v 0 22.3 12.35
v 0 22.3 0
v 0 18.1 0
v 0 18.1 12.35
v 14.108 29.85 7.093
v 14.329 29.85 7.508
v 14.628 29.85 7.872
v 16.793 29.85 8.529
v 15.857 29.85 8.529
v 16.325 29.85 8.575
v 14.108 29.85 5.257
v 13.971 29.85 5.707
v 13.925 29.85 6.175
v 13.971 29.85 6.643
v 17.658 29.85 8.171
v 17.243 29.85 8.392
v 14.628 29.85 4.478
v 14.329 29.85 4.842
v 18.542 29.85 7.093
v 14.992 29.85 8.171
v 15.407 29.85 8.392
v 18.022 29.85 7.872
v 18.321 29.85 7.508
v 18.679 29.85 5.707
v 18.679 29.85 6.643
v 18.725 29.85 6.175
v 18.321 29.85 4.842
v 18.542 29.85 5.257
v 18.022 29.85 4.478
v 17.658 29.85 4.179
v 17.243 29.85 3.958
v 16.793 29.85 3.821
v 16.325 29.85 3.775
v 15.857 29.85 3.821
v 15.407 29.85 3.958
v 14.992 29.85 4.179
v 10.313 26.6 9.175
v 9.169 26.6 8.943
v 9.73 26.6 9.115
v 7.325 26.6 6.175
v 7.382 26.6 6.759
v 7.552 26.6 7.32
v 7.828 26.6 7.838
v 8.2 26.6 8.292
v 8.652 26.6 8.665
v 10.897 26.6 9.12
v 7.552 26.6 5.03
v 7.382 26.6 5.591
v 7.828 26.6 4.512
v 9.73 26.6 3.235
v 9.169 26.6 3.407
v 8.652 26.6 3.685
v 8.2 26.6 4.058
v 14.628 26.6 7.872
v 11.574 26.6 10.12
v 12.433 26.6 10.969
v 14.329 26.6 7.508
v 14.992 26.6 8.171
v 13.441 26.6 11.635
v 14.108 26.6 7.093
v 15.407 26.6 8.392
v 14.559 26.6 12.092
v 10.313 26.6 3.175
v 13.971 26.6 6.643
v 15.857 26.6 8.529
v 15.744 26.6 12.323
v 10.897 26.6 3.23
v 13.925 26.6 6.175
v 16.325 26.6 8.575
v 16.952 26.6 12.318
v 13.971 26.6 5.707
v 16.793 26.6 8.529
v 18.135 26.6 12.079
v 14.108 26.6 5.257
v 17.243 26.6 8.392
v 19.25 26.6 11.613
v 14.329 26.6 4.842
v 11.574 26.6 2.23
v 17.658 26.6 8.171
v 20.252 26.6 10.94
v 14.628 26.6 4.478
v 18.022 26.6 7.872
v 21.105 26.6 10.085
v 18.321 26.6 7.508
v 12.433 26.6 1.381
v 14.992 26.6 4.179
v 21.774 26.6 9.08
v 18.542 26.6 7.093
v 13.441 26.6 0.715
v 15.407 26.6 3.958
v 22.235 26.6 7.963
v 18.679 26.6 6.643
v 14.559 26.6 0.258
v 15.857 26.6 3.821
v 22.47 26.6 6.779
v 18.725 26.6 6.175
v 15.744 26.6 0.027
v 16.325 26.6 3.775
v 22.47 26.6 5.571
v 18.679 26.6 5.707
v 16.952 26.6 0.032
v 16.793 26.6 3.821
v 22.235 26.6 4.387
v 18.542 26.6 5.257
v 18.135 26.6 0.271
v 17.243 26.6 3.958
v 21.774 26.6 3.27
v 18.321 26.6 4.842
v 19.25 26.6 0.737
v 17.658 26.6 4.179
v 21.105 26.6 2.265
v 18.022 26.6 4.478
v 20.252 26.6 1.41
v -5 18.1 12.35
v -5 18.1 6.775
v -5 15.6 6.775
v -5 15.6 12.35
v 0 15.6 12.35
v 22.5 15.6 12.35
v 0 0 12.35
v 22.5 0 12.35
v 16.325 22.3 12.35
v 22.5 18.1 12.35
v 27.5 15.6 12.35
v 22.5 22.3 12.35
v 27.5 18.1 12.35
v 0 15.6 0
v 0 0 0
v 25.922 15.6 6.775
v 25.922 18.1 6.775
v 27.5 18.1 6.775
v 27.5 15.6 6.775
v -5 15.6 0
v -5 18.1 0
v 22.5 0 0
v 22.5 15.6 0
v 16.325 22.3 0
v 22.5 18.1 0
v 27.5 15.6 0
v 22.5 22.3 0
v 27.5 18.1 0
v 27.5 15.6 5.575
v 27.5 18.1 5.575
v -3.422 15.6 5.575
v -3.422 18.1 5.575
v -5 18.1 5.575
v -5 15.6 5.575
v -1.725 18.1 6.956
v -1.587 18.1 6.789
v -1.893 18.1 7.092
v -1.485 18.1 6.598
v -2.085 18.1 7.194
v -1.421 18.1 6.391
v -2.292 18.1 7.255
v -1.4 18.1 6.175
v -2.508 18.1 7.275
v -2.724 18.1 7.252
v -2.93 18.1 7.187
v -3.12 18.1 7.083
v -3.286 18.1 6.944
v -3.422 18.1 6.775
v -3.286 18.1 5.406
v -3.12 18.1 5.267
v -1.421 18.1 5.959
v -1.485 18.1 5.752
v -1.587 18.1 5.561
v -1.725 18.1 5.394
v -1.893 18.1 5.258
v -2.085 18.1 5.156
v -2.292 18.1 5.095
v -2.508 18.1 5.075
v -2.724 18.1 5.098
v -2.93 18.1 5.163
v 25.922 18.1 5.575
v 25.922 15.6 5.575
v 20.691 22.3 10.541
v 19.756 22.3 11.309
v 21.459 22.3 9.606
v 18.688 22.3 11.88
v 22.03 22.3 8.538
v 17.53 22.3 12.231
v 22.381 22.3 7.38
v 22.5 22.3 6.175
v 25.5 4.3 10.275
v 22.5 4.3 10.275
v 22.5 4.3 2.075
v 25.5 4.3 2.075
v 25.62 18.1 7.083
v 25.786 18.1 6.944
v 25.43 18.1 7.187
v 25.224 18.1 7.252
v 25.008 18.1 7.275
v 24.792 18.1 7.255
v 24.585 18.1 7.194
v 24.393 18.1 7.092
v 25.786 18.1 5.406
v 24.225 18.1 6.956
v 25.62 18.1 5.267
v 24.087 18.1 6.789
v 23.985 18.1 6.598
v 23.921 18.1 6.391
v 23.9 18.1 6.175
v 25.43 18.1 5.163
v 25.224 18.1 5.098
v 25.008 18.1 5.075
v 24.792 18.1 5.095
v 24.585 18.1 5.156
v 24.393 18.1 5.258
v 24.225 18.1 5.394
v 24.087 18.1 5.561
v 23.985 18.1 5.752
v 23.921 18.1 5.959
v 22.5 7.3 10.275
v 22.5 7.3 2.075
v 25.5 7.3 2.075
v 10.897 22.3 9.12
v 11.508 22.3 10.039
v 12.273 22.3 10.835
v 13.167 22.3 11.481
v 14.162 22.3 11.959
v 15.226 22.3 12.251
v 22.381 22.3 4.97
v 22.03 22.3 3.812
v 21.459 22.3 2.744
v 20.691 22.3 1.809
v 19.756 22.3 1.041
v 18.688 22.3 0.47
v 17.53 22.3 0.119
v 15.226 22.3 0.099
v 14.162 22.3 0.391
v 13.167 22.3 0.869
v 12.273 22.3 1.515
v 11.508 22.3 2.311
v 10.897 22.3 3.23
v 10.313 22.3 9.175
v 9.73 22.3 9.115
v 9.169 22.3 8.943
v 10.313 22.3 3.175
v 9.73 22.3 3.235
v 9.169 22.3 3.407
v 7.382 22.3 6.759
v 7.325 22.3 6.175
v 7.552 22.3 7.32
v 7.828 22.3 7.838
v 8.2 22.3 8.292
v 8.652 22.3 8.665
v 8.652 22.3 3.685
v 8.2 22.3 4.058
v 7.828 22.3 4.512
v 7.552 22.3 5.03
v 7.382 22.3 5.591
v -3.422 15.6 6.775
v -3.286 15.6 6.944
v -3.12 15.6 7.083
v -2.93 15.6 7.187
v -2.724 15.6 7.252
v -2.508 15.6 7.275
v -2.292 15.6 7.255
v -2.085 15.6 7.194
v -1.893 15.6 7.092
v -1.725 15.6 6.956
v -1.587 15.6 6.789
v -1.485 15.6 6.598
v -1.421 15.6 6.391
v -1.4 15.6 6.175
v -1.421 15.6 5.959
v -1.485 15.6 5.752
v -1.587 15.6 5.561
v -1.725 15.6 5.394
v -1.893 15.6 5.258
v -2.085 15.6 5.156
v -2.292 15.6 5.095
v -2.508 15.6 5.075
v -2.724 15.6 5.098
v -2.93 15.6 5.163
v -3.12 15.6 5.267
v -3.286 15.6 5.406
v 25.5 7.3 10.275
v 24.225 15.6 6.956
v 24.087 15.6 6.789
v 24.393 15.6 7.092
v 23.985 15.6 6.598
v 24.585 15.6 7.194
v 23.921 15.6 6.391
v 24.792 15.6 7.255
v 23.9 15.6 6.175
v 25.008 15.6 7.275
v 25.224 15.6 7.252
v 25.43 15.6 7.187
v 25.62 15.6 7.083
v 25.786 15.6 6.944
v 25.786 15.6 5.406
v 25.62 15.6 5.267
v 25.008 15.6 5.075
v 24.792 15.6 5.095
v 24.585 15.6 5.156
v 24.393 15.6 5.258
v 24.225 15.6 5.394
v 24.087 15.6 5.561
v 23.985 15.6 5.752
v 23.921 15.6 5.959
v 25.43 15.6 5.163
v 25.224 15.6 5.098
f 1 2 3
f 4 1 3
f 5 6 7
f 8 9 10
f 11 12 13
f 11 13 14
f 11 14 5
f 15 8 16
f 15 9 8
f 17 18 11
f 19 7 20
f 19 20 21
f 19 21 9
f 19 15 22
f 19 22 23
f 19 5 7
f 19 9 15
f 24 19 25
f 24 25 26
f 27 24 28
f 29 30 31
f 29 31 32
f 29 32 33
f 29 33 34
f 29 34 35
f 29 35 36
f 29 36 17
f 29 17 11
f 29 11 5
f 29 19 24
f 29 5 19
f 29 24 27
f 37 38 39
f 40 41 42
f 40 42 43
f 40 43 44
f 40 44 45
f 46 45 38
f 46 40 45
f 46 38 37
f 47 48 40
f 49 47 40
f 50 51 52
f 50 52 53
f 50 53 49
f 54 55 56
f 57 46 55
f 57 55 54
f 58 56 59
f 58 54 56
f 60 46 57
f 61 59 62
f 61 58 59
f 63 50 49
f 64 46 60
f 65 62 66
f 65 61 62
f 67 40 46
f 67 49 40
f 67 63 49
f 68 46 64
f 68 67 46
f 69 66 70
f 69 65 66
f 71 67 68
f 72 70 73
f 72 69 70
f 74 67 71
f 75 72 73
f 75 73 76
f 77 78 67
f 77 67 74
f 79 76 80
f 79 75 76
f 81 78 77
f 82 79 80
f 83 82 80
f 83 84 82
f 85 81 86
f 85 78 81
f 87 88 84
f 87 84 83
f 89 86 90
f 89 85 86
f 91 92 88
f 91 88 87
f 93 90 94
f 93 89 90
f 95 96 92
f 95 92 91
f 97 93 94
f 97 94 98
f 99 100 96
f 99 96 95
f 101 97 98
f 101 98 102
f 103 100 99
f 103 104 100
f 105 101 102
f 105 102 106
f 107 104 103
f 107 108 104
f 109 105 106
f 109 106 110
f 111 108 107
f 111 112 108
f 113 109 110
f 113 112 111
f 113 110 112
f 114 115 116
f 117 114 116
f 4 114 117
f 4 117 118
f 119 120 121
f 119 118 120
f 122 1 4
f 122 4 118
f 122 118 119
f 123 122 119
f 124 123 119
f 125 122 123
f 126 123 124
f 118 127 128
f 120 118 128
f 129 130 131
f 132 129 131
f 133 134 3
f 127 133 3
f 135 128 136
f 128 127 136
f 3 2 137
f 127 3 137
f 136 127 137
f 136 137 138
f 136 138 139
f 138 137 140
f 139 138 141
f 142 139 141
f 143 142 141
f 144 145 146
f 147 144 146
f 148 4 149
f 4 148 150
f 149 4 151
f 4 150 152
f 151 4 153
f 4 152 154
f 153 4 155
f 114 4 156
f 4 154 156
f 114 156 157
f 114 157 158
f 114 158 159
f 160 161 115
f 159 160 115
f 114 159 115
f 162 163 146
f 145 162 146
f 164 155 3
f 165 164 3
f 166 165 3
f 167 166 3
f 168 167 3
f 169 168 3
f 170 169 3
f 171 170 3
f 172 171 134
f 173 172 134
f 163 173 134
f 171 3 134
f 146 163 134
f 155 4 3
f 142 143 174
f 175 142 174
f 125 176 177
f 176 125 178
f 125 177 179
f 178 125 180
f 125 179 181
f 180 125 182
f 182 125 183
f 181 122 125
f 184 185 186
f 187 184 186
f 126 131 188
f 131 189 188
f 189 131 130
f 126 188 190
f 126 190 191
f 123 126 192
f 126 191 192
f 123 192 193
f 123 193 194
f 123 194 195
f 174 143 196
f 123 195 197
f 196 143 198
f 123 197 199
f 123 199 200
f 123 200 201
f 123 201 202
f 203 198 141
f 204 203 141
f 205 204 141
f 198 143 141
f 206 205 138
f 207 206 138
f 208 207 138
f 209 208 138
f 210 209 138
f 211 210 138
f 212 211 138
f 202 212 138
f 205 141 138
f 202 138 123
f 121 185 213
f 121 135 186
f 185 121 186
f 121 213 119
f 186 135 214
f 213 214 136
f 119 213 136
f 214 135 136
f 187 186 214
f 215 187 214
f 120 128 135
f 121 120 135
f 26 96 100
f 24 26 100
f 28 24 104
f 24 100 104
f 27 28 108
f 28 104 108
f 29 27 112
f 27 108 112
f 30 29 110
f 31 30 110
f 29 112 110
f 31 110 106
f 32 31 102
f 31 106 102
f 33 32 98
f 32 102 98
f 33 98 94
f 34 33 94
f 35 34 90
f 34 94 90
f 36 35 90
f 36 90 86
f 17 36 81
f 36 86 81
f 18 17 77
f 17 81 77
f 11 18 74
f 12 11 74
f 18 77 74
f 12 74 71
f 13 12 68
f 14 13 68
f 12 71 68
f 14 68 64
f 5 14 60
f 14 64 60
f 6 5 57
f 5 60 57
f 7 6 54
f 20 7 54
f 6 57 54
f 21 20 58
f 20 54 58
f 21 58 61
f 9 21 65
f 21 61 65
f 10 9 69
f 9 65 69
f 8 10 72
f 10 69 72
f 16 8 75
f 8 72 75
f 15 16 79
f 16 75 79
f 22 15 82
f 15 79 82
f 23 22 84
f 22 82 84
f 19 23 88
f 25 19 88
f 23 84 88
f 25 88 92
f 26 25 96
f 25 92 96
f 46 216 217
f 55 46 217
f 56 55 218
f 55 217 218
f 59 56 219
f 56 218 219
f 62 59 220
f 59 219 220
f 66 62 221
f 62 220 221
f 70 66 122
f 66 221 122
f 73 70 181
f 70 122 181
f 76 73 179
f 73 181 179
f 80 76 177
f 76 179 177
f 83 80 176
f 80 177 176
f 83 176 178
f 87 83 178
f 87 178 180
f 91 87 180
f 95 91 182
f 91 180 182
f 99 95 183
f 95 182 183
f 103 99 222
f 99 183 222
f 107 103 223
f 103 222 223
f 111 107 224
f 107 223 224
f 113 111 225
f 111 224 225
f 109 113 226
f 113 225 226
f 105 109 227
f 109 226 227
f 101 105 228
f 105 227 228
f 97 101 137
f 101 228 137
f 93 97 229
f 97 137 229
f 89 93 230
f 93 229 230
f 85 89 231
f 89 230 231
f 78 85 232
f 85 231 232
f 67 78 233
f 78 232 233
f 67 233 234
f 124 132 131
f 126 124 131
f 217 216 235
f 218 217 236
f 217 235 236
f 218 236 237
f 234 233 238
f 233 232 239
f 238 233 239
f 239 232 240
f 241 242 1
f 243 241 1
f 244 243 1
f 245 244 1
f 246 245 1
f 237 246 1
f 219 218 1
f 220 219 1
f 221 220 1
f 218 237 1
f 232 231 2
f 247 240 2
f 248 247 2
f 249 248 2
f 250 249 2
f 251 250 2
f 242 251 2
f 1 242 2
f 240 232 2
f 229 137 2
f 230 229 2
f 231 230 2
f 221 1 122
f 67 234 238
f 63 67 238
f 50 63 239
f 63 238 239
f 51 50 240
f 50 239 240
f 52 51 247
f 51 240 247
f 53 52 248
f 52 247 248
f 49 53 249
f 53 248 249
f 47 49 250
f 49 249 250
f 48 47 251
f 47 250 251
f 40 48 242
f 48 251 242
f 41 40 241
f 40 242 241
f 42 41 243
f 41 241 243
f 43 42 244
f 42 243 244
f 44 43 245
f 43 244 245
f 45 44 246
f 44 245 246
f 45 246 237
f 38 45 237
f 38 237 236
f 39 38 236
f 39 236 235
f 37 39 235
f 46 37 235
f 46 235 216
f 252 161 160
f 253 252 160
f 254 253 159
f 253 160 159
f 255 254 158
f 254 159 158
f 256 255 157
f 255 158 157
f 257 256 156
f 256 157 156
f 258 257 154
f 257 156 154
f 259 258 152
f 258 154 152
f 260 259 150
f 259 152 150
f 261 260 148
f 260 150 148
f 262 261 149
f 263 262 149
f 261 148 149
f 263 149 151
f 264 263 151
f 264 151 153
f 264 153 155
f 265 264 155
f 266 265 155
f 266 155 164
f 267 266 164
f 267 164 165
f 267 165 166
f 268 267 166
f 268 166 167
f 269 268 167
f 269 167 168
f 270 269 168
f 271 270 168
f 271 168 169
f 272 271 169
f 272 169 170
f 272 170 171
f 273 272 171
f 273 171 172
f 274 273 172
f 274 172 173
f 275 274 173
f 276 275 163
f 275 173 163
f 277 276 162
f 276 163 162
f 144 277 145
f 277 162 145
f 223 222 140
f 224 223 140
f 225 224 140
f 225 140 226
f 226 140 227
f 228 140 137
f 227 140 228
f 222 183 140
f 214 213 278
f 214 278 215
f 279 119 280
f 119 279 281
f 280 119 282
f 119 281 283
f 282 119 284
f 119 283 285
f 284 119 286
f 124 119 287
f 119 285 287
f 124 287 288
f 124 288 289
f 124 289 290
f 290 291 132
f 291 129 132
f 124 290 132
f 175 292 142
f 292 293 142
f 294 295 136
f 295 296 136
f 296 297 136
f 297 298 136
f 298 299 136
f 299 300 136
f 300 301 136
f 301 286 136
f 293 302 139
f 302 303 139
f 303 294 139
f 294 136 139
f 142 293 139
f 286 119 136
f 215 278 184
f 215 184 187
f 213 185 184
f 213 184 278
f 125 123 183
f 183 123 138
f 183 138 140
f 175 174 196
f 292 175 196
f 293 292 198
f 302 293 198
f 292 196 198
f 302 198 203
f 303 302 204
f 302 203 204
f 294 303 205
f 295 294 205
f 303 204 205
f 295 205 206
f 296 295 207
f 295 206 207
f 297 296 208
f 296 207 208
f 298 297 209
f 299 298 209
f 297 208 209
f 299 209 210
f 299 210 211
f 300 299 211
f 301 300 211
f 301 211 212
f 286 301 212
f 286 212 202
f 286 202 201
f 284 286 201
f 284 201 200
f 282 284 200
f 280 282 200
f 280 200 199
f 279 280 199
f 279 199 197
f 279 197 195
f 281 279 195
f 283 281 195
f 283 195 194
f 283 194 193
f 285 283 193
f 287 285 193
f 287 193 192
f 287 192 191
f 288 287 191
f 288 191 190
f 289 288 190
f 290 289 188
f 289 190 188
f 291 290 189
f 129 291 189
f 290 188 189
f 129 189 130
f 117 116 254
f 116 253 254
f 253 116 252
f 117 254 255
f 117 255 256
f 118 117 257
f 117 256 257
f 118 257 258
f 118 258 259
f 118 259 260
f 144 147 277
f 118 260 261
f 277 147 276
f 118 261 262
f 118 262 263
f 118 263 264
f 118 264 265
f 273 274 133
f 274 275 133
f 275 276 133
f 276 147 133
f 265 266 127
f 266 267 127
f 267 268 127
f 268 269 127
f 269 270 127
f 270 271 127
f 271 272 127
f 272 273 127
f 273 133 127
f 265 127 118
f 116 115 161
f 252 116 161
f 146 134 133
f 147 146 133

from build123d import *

# Parameters (mm, degrees)
BOSS_EXTRUDE1_DEPTH = 12.35
BOSS_EXTRUDE2_DEPTH = 4.3
SKETCH3_R           = 2.4
BOSS_EXTRUDE3_DEPTH = 3.25
SKETCH4_W           = 8.2
SKETCH4_H           = 3
BOSS_EXTRUDE4_DEPTH = 3
CUT_EXTRUDE1_DEPTH  = 3


with BuildPart() as part:
    # Sketch1 → Boss-Extrude1 (new body)
    with BuildSketch(Plane.XY):
        Polygon((0, 0), (22.5, 0), (22.5, 15.6), (27.5, 15.6), (27.5, 18.1), (22.5, 18.1), (22.5, 22.3), (0, 22.3), (0, 18.1), (-5, 18.1), (-5, 15.6), (0, 15.6), align=None)
    extrude(amount=BOSS_EXTRUDE1_DEPTH)

    # Sketch2 → Boss-Extrude2 (add)
    with BuildSketch(Plane(origin=(0, 22.3, 0), x_dir=(1, 0, 0), z_dir=(0, 1, 0))):
        with BuildLine():
            ThreePointArc((10.897447917, -9.119877482), (22.5, -6.175), (10.897447917, -3.230122518))
            ThreePointArc((10.897447917, -3.230122518), (7.325, -6.175), (10.897447917, -9.119877482))
        make_face()
    extrude(amount=BOSS_EXTRUDE2_DEPTH)

    # Sketch3 → Boss-Extrude3 (add)
    with BuildSketch(Plane(origin=(0, 26.6, 0), x_dir=(1, 0, 0), z_dir=(0, 1, 0))):
        with Locations((16.325, -6.175)):
            Circle(SKETCH3_R)
    extrude(amount=BOSS_EXTRUDE3_DEPTH)

    # Sketch4 → Boss-Extrude4 (add)
    with BuildSketch(Plane(origin=(22.5, 0, 0), x_dir=(0, 0, -1), z_dir=(1, 0, 0))):
        with Locations((-6.175, 5.8)):
            Rectangle(SKETCH4_W, SKETCH4_H)
    extrude(amount=BOSS_EXTRUDE4_DEPTH)

    # Sketch5 → Cut-Extrude1 (cut)
    with BuildSketch(Plane(origin=(0, 18.1, 0), x_dir=(1, 0, 0), z_dir=(0, 1, 0))):
        with BuildLine():
            Line((-3.421954446, -5.575), (-5, -5.575))
            Line((-5, -5.575), (-5, -6.775))
            Line((-5, -6.775), (-3.421954446, -6.775))
            ThreePointArc((-3.421954446, -6.775), (-1.4, -6.175), (-3.421954446, -5.575))
        make_face()
        with BuildLine():
            Line((25.921954446, -6.775), (27.5, -6.775))
            Line((27.5, -6.775), (27.5, -5.575))
            Line((27.5, -5.575), (25.921954446, -5.575))
            ThreePointArc((25.921954446, -5.575), (23.9, -6.175), (25.921954446, -6.775))
        make_face()
    extrude(amount=-CUT_EXTRUDE1_DEPTH, mode=Mode.SUBTRACT)


solid = part.part
